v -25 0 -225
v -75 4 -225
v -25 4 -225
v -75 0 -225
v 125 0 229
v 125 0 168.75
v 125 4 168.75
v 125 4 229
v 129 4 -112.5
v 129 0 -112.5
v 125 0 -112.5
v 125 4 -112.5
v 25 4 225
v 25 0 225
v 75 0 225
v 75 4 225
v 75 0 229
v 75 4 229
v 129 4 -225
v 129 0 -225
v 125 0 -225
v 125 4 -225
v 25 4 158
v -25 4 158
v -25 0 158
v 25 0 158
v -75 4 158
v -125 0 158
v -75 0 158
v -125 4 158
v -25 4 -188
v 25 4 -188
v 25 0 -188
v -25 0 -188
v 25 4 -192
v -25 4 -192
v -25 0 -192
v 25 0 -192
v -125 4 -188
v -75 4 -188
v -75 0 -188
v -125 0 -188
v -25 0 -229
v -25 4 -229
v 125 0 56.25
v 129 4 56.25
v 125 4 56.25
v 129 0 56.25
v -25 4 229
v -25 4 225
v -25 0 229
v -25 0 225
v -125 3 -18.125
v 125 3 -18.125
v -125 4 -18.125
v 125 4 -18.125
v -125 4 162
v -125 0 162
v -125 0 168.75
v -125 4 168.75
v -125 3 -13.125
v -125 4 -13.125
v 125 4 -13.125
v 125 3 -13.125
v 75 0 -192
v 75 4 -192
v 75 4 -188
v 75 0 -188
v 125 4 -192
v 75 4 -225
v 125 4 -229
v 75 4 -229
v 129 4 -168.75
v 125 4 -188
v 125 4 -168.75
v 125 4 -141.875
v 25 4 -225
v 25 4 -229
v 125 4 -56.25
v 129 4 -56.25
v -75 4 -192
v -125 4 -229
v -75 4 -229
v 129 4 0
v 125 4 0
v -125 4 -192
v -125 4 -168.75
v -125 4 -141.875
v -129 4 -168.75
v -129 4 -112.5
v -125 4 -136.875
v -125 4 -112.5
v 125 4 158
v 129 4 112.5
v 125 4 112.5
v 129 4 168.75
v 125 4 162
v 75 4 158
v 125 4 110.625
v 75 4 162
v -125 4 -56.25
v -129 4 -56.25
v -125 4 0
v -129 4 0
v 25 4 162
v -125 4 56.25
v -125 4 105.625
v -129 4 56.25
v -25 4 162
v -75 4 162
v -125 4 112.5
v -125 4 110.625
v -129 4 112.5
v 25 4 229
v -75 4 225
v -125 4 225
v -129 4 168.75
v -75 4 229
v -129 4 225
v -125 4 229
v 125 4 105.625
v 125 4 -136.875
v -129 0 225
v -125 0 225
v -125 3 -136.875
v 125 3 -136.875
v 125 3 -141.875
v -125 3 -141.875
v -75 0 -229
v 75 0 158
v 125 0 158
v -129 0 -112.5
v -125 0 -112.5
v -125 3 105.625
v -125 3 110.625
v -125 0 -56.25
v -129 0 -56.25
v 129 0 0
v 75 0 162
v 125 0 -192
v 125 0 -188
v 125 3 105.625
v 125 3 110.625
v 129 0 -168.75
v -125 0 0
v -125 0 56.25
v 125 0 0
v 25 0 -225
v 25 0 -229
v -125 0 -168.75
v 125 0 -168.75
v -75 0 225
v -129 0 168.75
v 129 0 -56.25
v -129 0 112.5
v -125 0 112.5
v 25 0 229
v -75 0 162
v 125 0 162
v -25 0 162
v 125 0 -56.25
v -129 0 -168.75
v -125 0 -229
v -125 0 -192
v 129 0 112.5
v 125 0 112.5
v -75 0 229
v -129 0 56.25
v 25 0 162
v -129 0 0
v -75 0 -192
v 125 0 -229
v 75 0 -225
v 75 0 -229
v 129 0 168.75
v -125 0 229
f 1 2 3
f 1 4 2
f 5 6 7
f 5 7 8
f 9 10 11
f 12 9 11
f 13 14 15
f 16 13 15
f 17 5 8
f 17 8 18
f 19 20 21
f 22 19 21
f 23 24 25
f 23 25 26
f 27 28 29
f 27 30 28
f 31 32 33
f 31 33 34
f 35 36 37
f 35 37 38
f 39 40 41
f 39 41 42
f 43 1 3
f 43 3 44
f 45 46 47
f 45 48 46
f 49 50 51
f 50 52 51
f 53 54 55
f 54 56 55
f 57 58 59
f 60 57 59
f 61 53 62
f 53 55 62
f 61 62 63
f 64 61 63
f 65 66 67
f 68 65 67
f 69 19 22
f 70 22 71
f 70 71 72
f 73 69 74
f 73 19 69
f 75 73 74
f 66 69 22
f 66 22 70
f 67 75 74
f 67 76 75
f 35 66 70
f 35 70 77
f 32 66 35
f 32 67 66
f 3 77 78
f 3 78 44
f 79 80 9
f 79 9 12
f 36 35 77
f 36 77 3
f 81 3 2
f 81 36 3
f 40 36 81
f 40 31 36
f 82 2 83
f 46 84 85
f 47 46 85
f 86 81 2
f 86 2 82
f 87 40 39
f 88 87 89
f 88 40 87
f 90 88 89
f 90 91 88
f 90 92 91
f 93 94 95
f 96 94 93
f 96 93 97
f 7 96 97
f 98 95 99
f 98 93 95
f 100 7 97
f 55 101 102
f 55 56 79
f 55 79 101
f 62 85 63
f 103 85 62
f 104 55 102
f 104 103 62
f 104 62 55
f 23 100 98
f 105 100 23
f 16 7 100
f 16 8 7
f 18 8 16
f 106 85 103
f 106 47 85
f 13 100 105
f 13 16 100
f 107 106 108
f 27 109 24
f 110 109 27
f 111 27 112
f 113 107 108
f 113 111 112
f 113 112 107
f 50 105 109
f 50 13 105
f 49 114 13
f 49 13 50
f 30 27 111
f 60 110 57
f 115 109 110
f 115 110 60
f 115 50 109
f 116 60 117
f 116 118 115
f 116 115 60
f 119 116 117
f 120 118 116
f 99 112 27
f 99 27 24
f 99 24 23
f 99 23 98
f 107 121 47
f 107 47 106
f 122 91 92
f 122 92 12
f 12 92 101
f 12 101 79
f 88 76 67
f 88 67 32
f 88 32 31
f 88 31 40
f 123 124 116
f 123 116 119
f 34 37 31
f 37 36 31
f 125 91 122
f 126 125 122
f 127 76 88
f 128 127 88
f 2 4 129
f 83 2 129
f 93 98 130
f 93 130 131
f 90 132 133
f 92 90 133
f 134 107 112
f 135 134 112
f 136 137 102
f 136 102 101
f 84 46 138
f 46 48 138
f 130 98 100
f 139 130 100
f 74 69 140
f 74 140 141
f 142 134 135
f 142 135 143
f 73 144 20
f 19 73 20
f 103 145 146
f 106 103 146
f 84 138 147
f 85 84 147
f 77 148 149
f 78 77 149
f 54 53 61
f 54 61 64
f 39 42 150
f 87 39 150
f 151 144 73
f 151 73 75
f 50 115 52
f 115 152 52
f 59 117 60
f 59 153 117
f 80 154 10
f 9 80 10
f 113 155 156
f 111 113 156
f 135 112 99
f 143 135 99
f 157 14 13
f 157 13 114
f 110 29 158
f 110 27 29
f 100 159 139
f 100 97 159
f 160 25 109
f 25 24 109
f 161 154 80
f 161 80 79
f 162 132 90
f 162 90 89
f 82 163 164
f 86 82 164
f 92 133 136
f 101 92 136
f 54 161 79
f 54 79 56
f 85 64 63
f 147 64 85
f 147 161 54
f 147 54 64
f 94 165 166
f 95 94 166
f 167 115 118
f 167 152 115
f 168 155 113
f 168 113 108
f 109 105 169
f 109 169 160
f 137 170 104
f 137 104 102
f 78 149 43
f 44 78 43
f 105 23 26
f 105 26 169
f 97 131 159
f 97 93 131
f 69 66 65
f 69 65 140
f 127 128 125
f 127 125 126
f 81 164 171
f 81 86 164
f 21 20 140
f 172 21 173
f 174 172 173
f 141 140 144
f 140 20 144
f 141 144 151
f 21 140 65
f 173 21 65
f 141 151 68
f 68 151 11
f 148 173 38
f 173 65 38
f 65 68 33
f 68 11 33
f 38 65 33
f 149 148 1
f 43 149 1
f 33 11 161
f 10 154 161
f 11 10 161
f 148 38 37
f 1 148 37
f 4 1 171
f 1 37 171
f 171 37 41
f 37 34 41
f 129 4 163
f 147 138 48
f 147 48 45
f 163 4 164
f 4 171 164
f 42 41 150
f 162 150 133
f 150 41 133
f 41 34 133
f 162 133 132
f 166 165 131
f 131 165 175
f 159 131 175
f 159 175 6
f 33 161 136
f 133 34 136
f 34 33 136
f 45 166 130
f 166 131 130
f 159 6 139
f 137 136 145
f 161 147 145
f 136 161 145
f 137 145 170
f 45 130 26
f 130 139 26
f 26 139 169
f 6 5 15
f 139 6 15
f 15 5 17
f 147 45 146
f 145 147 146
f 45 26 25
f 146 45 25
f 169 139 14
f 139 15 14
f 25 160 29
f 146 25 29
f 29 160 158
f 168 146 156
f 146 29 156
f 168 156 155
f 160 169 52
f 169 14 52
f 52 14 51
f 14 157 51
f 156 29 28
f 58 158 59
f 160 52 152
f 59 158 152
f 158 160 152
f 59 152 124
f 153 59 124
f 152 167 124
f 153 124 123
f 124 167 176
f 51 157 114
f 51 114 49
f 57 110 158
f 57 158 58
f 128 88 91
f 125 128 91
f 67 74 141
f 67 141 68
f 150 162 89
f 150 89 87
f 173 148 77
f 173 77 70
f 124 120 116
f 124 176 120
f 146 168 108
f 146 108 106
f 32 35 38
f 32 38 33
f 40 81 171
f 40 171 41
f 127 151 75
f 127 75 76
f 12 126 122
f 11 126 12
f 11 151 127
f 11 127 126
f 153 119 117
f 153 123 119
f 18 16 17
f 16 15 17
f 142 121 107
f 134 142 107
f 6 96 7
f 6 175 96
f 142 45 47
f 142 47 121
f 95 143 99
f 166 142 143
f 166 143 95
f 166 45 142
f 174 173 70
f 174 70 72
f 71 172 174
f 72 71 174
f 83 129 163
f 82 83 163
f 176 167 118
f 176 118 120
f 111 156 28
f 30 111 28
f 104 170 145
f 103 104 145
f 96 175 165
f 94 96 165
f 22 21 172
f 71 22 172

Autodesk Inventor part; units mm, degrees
ref_plane "YZ Plane" through (0, 0, 0) normal (1, 0, 0) x (0, 1, 0)
ref_plane "XZ Plane" through (0, 0, 0) normal (0, 1, 0) x (-1, 0, 0)
ref_plane "XY Plane" through (0, 0, 0) normal (0, 0, 1) x (1, 0, 0)
sketch "Sketch1" plane through (0, 0, 0) normal (0, 1, 0) x (-1, 0, 0)
  line L0 (-125, 225) -> (125, 225) construction
  line L1 (125, 225) -> (125, -225) construction
  line L2 (125, -225) -> (-125, -225) construction
  line L3 (-125, -225) -> (-125, 225) construction
  line L4 (-125, 225) -> (125, -225) construction
  line L5 (125, 225) -> (-125, -225) construction
  line L6 (125, 225) -> (75, 225) construction
  line L7 (75, 225) -> (75, 229)
  line L8 (75, 229) -> (125, 229)
  line L9 (125, 229) -> (125, 225)
  line L10 (125, 225) -> (129, 225)
  line L11 (129, 225) -> (129, 168.75)
  line L12 (129, 168.75) -> (125, 168.75)
  line L13 (125, 168.75) -> (125, 225) construction
  line L14 (-125, 225) -> (-129, 225) construction
  line L15 (-129, 225) -> (-129, 168.75) construction
  line L16 (-129, 168.75) -> (-125, 168.75)
  line L17 (-125, 168.75) -> (-125, 225)
  line L18 (125, -225) -> (75, -225) construction
  line L19 (75, -225) -> (75, -229)
  line L20 (75, -229) -> (125, -229)
  line L21 (125, -229) -> (125, -225)
  line L22 (125, 112.5) -> (125, 168.75)
  line L23 (125, 168.75) -> (129, 168.75)
  line L24 (129, 112.5) -> (125, 112.5)
  line L25 (129, 168.75) -> (129, 112.5) construction
  line L26 (-125, 112.5) -> (-125, 168.75) construction
  line L27 (-125, 168.75) -> (-129, 168.75)
  line L28 (-129, 168.75) -> (-129, 112.5)
  line L29 (-129, 112.5) -> (-125, 112.5)
  line L30 (125, 56.25) -> (125, 112.5) construction
  line L31 (125, 112.5) -> (129, 112.5)
  line L32 (129, 56.25) -> (125, 56.25)
  line L33 (129, 112.5) -> (129, 56.25)
  line L34 (-125, 56.25) -> (-125, 112.5)
  line L35 (-125, 112.5) -> (-129, 112.5)
  line L36 (-129, 112.5) -> (-129, 56.25) construction
  line L37 (-129, 56.25) -> (-125, 56.25)
  line L38 (125, 0) -> (125, 56.25)
  line L39 (125, 56.25) -> (129, 56.25)
  line L40 (129, 0) -> (125, 0)
  line L41 (129, 56.25) -> (129, 0) construction
  line L42 (-125, 0) -> (-125, 56.25) construction
  line L43 (-125, 56.25) -> (-129, 56.25)
  line L44 (-129, 56.25) -> (-129, 0)
  line L45 (-129, 0) -> (-125, 0)
  line L46 (125, -56.25) -> (125, 0) construction
  line L47 (125, 0) -> (129, 0)
  line L48 (129, -56.25) -> (125, -56.25)
  line L49 (129, 0) -> (129, -56.25)
  line L50 (-125, -56.25) -> (-125, 0)
  line L51 (-125, 0) -> (-129, 0)
  line L52 (-129, 0) -> (-129, -56.25) construction
  line L53 (-129, -56.25) -> (-125, -56.25)
  line L54 (125, -112.5) -> (125, -56.25)
  line L55 (125, -56.25) -> (129, -56.25)
  line L56 (129, -112.5) -> (125, -112.5)
  line L57 (129, -56.25) -> (129, -112.5) construction
  line L58 (-125, -112.5) -> (-125, -56.25) construction
  line L59 (-125, -56.25) -> (-129, -56.25)
  line L60 (-129, -56.25) -> (-129, -112.5)
  line L61 (-129, -112.5) -> (-125, -112.5)
  line L62 (125, -168.75) -> (125, -112.5) construction
  line L63 (125, -112.5) -> (129, -112.5)
  line L64 (129, -168.75) -> (125, -168.75)
  line L65 (129, -112.5) -> (129, -168.75)
  line L66 (-125, -168.75) -> (-125, -112.5)
  line L67 (-125, -112.5) -> (-129, -112.5)
  line L68 (-129, -112.5) -> (-129, -168.75) construction
  line L69 (-129, -168.75) -> (-125, -168.75)
  line L70 (125, -225) -> (125, -168.75)
  line L71 (125, -168.75) -> (129, -168.75)
  line L72 (129, -225) -> (125, -225) construction
  line L73 (129, -168.75) -> (129, -225) construction
  line L74 (-125, -225) -> (-125, -168.75) construction
  line L75 (-125, -168.75) -> (-129, -168.75)
  line L76 (-129, -168.75) -> (-129, -225)
  line L77 (-129, -225) -> (-125, -225)
  line L78 (75, 229) -> (75, 225)
  line L79 (25, 225) -> (25, 229)
  line L80 (25, 229) -> (75, 229) construction
  line L81 (75, 225) -> (25, 225)
  line L82 (75, -225) -> (25, -225)
  line L83 (25, -225) -> (25, -229)
  line L84 (25, -229) -> (75, -229) construction
  line L85 (75, -229) -> (75, -225)
  line L86 (25, 229) -> (25, 225)
  line L87 (-25, 225) -> (-25, 229)
  line L88 (-25, 229) -> (25, 229)
  line L89 (25, 225) -> (-25, 225) construction
  line L90 (25, -225) -> (-25, -225) construction
  line L91 (-25, -225) -> (-25, -229)
  line L92 (-25, -229) -> (25, -229)
  line L93 (25, -229) -> (25, -225)
  line L94 (-25, 229) -> (-25, 225)
  line L95 (-75, 225) -> (-75, 229)
  line L96 (-75, 229) -> (-25, 229) construction
  line L97 (-25, 225) -> (-75, 225)
  line L98 (-25, -225) -> (-75, -225)
  line L99 (-75, -225) -> (-75, -229)
  line L100 (-75, -229) -> (-25, -229) construction
  line L101 (-25, -229) -> (-25, -225)
  line L102 (-75, 229) -> (-75, 225)
  line L103 (-125, 225) -> (-125, 229)
  line L104 (-125, 229) -> (-75, 229)
  line L105 (-75, 225) -> (-125, 225) construction
  line L106 (-75, -225) -> (-125, -225) construction
  line L107 (-125, -225) -> (-125, -229)
  line L108 (-125, -229) -> (-75, -229)
  line L109 (-75, -229) -> (-75, -225)
  point P0 (0, 0)
  point P1 (75, -225)
  point P2 (25, -225)
  point P3 (-25, -225)
  point P4 (-75, -225)
  point P5 (-129, 168.75)
  point P6 (-129, 56.25)
  point P7 (-129, -56.25)
  point P8 (-129, -168.75)
  point P9 (-125, -225)
  point P10 (-25, -225)
  point P11 (75, -225)
  point P12 (125, -56.25)
  point P13 (125, 56.25)
  point P14 (125, 168.75)
  dimension "d0" = 250
  dimension "d1" = 450
  dimension "d2" = 50
  dimension "d3" = 4
  dimension "d4" = 4
  dimension "d5" = 56.25
  dimension "d6" = 4
  dimension "d7" = 56.25
  dimension "d8" = 50
  dimension "d9" = 4
  dimension "d12" = 56.25
  dimension "d19" = 50
extrude "Extrusion1" add sketch "Sketch1" along normal blind 4
sketch "Sketch3" plane through (0, 4, 0) normal (0, 1, 0) x (1, 0, 0)
  line L0 (-129, 56.25) -> (-129, 0) projected
  line L1 (-129, 15.625) -> (125, 15.625) construction
  line L2 (125, 0) -> (125, 56.25) projected
  line L3 (-129, 13.125) -> (125, 13.125)
  line L4 (125, 13.125) -> (125, 18.125)
  line L5 (125, 18.125) -> (-129, 18.125)
  line L6 (-129, 18.125) -> (-129, 13.125)
  line L7 (-129, 18.125) -> (-125, 18.125)
  line L8 (-125, 18.125) -> (-125, 13.125)
  line L9 (-125, 13.125) -> (-129, 13.125)
  line L10 (-129, 13.125) -> (-129, 18.125)
  line L11 (-25, -225) -> (-25, -229) projected
  line L12 (-25, -229) -> (25, -229) projected
  line L13 (25, -229) -> (25, -225) projected
  line L14 (25, -225) -> (75, -225) projected
  line L15 (75, -225) -> (75, -229) projected
  line L16 (75, -229) -> (125, -229) projected
  line L17 (125, -229) -> (125, -168.75) projected
  line L18 (125, -168.75) -> (129, -168.75) projected
  line L19 (129, -168.75) -> (129, -112.5) projected
  line L20 (129, -112.5) -> (125, -112.5) projected
  line L21 (125, -112.5) -> (125, -56.25) projected
  line L22 (125, -56.25) -> (129, -56.25) projected
  line L23 (129, -56.25) -> (129, 0) projected
  line L24 (129, 0) -> (125, 0) projected
  line L25 (125, 0) -> (125, 56.25) projected
  line L26 (125, 56.25) -> (129, 56.25) projected
  line L27 (129, 56.25) -> (129, 112.5) projected
  line L28 (129, 112.5) -> (125, 112.5) projected
  line L29 (125, 112.5) -> (125, 168.75) projected
  line L30 (125, 168.75) -> (129, 168.75) projected
  line L31 (129, 168.75) -> (129, 225) projected
  line L32 (129, 225) -> (125, 225) projected
  line L33 (125, 225) -> (125, 229) projected
  line L34 (125, 229) -> (75, 229) projected
  line L35 (75, 229) -> (75, 225) projected
  line L36 (75, 225) -> (25, 225) projected
  line L37 (25, 225) -> (25, 229) projected
  line L38 (25, 229) -> (-25, 229) projected
  line L39 (-25, 229) -> (-25, 225) projected
  line L40 (-25, 225) -> (-75, 225) projected
  line L41 (-75, 225) -> (-75, 229) projected
  line L42 (-75, 229) -> (-125, 229) projected
  line L43 (-125, 229) -> (-125, 168.75) projected
  line L44 (-125, 168.75) -> (-129, 168.75) projected
  line L45 (-129, 168.75) -> (-129, 112.5) projected
  line L46 (-129, 112.5) -> (-125, 112.5) projected
  line L47 (-125, 112.5) -> (-125, 56.25) projected
  line L48 (-125, 56.25) -> (-129, 56.25) projected
  line L49 (-129, 56.25) -> (-129, 0) projected
  line L50 (-129, 0) -> (-125, 0) projected
  line L51 (-125, 0) -> (-125, -56.25) projected
  line L52 (-125, -56.25) -> (-129, -56.25) projected
  line L53 (-129, -56.25) -> (-129, -112.5) projected
  line L54 (-129, -112.5) -> (-125, -112.5) projected
  line L55 (-125, -112.5) -> (-125, -168.75) projected
  line L56 (-125, -168.75) -> (-129, -168.75) projected
  line L57 (-129, -168.75) -> (-129, -225) projected
  line L58 (-129, -225) -> (-125, -225) projected
  line L59 (-125, -225) -> (-125, -229) projected
  line L60 (-125, -229) -> (-75, -229) projected
  line L61 (-75, -229) -> (-75, -225) projected
  line L62 (-75, -225) -> (-25, -225) projected
  line L63 (-125, -112.5) -> (-125, -168.75) projected
  line L64 (-109.8402, -80.4521) -> (129, -140.625) construction
  line L65 (129, -168.75) -> (129, -112.5) projected
  line L66 (-125, -110.625) -> (125, -110.625)
  line L67 (125, -110.625) -> (125, -105.625)
  line L68 (125, -105.625) -> (-125, -105.625)
  line L69 (-125, -105.625) -> (-125, -110.625)
  line L70 (-125, -110.625) -> (125, -105.625) construction
  line L71 (125, -110.625) -> (-125, -105.625) construction
  line L72 (125, 0) -> (125, 56.25) projected
  line L73 (-125, 0) -> (-125, -56.25) projected
  line L74 (129, 168.75) -> (129, 225) projected
  line L75 (129, 139.375) -> (-125, 139.375) construction
  line L76 (-125, 136.875) -> (125, 136.875)
  line L77 (125, 136.875) -> (125, 141.875)
  line L78 (125, 141.875) -> (-125, 141.875)
  line L79 (-125, 141.875) -> (-125, 136.875)
  line L80 (-125, 136.875) -> (125, 141.875) construction
  line L81 (125, 136.875) -> (-125, 141.875) construction
  line L82 (-125, 229) -> (-125, 168.75) projected
  line L83 (125, 112.5) -> (125, 168.75) projected
  point P0 (0, 0)
  point P1 (-129, 18.125)
  point P2 (-125, 18.125)
  point P3 (-125, 13.125)
  point P4 (0, -108.125)
  point P5 (-125, -138.125)
  point P6 (-125, -143.125)
  point P7 (0, 139.375)
  point P8 (-125, 199.375)
  point P9 (-125, 194.375)
  dimension "d30" = 5
  dimension "d34" = 5
  dimension "d35" = 5
  dimension "d36" = 5
  dimension "d56" = 118.375
  dimension "d57" = 118.75
  dimension "d59" = 118.75
extrude "Extrusion2" cut sketch "Sketch3" against normal blind 1 contours L5 L2 L3 L8 | L76 L79 L78 L29 | L21 L66 L69 L68
sketch "Sketch4" plane through (0, 4, 0) normal (0, 1, 0) x (1, 0, 0)
  line L0 (-125, -158) -> (-75, -158)
  line L1 (-75, -158) -> (-75, -162)
  line L2 (-75, -162) -> (-125, -162)
  line L3 (-125, -162) -> (-125, -158)
  line L4 (-75, -225) -> (-25, -225) projected
  line L5 (125, -110.625) -> (-125, -110.625) projected
  line L6 (-75, -158) -> (-25, -158)
  line L7 (-25, -158) -> (-25, -162)
  line L8 (-25, -162) -> (-75, -162)
  line L9 (-75, -162) -> (-75, -158)
  line L10 (-25, -158) -> (25, -158)
  line L11 (25, -158) -> (25, -162)
  line L12 (25, -162) -> (-25, -162)
  line L13 (-25, -162) -> (-25, -158)
  line L14 (25, -158) -> (75, -158)
  line L15 (75, -158) -> (75, -162)
  line L16 (75, -162) -> (25, -162)
  line L17 (25, -162) -> (25, -158)
  line L18 (75, -158) -> (125, -158)
  line L19 (125, -158) -> (125, -162)
  line L20 (125, -162) -> (75, -162)
  line L21 (75, -162) -> (75, -158)
  line L22 (-125, 0) -> (-125, -56.25) projected
  line L23 (-125, 192) -> (-75, 192)
  line L24 (-75, 192) -> (-75, 188)
  line L25 (-75, 188) -> (-125, 188)
  line L26 (-125, 188) -> (-125, 192)
  line L27 (-75, 192) -> (-25, 192)
  line L28 (-25, 192) -> (-25, 188)
  line L29 (-25, 188) -> (-25, 192)
  line L30 (-25, 188) -> (-75, 188)
  line L31 (-75, 188) -> (-75, 192)
  line L32 (-25, 192) -> (25, 192)
  line L33 (25, 188) -> (-25, 188)
  line L34 (25, 192) -> (25, 188)
  line L35 (25, 188) -> (25, 192)
  line L36 (25, 192) -> (75, 192)
  line L37 (75, 192) -> (75, 188)
  line L38 (75, 188) -> (75, 192)
  line L39 (75, 192) -> (125, 192)
  line L40 (125, 192) -> (125, 188)
  line L41 (125, 188) -> (75, 188)
  line L42 (75, 188) -> (25, 188)
  point P0 (0, 0)
  point P1 (-125, -160)
  point P2 (-75, -160)
  point P3 (-25, -160)
  point P4 (25, -160)
  point P5 (75, -160)
  point P6 (-25, -162)
  point P7 (-125, 190)
  point P8 (-25, 190)
  point P9 (-75, 190)
  point P10 (25, 190)
  point P11 (75, 190)
  point P12 (-25, 188)
  point P13 (-125, -168.75)
  dimension "d37" = 50
  dimension "d38" = 4
  dimension "d39" = 63
  dimension "d42" = 50
  dimension "d51" = 350
extrude "Extrusion3" cut sketch "Sketch4" against normal up to next contours L0 L1 L2 L3 | L10 L11 L12 L7 | L18 L19 L20 L15 | L23 L24 L25 L26 | L32 L34 L33 L28 | L39 L40 L41 L37
properties part number "Wall_V2"
